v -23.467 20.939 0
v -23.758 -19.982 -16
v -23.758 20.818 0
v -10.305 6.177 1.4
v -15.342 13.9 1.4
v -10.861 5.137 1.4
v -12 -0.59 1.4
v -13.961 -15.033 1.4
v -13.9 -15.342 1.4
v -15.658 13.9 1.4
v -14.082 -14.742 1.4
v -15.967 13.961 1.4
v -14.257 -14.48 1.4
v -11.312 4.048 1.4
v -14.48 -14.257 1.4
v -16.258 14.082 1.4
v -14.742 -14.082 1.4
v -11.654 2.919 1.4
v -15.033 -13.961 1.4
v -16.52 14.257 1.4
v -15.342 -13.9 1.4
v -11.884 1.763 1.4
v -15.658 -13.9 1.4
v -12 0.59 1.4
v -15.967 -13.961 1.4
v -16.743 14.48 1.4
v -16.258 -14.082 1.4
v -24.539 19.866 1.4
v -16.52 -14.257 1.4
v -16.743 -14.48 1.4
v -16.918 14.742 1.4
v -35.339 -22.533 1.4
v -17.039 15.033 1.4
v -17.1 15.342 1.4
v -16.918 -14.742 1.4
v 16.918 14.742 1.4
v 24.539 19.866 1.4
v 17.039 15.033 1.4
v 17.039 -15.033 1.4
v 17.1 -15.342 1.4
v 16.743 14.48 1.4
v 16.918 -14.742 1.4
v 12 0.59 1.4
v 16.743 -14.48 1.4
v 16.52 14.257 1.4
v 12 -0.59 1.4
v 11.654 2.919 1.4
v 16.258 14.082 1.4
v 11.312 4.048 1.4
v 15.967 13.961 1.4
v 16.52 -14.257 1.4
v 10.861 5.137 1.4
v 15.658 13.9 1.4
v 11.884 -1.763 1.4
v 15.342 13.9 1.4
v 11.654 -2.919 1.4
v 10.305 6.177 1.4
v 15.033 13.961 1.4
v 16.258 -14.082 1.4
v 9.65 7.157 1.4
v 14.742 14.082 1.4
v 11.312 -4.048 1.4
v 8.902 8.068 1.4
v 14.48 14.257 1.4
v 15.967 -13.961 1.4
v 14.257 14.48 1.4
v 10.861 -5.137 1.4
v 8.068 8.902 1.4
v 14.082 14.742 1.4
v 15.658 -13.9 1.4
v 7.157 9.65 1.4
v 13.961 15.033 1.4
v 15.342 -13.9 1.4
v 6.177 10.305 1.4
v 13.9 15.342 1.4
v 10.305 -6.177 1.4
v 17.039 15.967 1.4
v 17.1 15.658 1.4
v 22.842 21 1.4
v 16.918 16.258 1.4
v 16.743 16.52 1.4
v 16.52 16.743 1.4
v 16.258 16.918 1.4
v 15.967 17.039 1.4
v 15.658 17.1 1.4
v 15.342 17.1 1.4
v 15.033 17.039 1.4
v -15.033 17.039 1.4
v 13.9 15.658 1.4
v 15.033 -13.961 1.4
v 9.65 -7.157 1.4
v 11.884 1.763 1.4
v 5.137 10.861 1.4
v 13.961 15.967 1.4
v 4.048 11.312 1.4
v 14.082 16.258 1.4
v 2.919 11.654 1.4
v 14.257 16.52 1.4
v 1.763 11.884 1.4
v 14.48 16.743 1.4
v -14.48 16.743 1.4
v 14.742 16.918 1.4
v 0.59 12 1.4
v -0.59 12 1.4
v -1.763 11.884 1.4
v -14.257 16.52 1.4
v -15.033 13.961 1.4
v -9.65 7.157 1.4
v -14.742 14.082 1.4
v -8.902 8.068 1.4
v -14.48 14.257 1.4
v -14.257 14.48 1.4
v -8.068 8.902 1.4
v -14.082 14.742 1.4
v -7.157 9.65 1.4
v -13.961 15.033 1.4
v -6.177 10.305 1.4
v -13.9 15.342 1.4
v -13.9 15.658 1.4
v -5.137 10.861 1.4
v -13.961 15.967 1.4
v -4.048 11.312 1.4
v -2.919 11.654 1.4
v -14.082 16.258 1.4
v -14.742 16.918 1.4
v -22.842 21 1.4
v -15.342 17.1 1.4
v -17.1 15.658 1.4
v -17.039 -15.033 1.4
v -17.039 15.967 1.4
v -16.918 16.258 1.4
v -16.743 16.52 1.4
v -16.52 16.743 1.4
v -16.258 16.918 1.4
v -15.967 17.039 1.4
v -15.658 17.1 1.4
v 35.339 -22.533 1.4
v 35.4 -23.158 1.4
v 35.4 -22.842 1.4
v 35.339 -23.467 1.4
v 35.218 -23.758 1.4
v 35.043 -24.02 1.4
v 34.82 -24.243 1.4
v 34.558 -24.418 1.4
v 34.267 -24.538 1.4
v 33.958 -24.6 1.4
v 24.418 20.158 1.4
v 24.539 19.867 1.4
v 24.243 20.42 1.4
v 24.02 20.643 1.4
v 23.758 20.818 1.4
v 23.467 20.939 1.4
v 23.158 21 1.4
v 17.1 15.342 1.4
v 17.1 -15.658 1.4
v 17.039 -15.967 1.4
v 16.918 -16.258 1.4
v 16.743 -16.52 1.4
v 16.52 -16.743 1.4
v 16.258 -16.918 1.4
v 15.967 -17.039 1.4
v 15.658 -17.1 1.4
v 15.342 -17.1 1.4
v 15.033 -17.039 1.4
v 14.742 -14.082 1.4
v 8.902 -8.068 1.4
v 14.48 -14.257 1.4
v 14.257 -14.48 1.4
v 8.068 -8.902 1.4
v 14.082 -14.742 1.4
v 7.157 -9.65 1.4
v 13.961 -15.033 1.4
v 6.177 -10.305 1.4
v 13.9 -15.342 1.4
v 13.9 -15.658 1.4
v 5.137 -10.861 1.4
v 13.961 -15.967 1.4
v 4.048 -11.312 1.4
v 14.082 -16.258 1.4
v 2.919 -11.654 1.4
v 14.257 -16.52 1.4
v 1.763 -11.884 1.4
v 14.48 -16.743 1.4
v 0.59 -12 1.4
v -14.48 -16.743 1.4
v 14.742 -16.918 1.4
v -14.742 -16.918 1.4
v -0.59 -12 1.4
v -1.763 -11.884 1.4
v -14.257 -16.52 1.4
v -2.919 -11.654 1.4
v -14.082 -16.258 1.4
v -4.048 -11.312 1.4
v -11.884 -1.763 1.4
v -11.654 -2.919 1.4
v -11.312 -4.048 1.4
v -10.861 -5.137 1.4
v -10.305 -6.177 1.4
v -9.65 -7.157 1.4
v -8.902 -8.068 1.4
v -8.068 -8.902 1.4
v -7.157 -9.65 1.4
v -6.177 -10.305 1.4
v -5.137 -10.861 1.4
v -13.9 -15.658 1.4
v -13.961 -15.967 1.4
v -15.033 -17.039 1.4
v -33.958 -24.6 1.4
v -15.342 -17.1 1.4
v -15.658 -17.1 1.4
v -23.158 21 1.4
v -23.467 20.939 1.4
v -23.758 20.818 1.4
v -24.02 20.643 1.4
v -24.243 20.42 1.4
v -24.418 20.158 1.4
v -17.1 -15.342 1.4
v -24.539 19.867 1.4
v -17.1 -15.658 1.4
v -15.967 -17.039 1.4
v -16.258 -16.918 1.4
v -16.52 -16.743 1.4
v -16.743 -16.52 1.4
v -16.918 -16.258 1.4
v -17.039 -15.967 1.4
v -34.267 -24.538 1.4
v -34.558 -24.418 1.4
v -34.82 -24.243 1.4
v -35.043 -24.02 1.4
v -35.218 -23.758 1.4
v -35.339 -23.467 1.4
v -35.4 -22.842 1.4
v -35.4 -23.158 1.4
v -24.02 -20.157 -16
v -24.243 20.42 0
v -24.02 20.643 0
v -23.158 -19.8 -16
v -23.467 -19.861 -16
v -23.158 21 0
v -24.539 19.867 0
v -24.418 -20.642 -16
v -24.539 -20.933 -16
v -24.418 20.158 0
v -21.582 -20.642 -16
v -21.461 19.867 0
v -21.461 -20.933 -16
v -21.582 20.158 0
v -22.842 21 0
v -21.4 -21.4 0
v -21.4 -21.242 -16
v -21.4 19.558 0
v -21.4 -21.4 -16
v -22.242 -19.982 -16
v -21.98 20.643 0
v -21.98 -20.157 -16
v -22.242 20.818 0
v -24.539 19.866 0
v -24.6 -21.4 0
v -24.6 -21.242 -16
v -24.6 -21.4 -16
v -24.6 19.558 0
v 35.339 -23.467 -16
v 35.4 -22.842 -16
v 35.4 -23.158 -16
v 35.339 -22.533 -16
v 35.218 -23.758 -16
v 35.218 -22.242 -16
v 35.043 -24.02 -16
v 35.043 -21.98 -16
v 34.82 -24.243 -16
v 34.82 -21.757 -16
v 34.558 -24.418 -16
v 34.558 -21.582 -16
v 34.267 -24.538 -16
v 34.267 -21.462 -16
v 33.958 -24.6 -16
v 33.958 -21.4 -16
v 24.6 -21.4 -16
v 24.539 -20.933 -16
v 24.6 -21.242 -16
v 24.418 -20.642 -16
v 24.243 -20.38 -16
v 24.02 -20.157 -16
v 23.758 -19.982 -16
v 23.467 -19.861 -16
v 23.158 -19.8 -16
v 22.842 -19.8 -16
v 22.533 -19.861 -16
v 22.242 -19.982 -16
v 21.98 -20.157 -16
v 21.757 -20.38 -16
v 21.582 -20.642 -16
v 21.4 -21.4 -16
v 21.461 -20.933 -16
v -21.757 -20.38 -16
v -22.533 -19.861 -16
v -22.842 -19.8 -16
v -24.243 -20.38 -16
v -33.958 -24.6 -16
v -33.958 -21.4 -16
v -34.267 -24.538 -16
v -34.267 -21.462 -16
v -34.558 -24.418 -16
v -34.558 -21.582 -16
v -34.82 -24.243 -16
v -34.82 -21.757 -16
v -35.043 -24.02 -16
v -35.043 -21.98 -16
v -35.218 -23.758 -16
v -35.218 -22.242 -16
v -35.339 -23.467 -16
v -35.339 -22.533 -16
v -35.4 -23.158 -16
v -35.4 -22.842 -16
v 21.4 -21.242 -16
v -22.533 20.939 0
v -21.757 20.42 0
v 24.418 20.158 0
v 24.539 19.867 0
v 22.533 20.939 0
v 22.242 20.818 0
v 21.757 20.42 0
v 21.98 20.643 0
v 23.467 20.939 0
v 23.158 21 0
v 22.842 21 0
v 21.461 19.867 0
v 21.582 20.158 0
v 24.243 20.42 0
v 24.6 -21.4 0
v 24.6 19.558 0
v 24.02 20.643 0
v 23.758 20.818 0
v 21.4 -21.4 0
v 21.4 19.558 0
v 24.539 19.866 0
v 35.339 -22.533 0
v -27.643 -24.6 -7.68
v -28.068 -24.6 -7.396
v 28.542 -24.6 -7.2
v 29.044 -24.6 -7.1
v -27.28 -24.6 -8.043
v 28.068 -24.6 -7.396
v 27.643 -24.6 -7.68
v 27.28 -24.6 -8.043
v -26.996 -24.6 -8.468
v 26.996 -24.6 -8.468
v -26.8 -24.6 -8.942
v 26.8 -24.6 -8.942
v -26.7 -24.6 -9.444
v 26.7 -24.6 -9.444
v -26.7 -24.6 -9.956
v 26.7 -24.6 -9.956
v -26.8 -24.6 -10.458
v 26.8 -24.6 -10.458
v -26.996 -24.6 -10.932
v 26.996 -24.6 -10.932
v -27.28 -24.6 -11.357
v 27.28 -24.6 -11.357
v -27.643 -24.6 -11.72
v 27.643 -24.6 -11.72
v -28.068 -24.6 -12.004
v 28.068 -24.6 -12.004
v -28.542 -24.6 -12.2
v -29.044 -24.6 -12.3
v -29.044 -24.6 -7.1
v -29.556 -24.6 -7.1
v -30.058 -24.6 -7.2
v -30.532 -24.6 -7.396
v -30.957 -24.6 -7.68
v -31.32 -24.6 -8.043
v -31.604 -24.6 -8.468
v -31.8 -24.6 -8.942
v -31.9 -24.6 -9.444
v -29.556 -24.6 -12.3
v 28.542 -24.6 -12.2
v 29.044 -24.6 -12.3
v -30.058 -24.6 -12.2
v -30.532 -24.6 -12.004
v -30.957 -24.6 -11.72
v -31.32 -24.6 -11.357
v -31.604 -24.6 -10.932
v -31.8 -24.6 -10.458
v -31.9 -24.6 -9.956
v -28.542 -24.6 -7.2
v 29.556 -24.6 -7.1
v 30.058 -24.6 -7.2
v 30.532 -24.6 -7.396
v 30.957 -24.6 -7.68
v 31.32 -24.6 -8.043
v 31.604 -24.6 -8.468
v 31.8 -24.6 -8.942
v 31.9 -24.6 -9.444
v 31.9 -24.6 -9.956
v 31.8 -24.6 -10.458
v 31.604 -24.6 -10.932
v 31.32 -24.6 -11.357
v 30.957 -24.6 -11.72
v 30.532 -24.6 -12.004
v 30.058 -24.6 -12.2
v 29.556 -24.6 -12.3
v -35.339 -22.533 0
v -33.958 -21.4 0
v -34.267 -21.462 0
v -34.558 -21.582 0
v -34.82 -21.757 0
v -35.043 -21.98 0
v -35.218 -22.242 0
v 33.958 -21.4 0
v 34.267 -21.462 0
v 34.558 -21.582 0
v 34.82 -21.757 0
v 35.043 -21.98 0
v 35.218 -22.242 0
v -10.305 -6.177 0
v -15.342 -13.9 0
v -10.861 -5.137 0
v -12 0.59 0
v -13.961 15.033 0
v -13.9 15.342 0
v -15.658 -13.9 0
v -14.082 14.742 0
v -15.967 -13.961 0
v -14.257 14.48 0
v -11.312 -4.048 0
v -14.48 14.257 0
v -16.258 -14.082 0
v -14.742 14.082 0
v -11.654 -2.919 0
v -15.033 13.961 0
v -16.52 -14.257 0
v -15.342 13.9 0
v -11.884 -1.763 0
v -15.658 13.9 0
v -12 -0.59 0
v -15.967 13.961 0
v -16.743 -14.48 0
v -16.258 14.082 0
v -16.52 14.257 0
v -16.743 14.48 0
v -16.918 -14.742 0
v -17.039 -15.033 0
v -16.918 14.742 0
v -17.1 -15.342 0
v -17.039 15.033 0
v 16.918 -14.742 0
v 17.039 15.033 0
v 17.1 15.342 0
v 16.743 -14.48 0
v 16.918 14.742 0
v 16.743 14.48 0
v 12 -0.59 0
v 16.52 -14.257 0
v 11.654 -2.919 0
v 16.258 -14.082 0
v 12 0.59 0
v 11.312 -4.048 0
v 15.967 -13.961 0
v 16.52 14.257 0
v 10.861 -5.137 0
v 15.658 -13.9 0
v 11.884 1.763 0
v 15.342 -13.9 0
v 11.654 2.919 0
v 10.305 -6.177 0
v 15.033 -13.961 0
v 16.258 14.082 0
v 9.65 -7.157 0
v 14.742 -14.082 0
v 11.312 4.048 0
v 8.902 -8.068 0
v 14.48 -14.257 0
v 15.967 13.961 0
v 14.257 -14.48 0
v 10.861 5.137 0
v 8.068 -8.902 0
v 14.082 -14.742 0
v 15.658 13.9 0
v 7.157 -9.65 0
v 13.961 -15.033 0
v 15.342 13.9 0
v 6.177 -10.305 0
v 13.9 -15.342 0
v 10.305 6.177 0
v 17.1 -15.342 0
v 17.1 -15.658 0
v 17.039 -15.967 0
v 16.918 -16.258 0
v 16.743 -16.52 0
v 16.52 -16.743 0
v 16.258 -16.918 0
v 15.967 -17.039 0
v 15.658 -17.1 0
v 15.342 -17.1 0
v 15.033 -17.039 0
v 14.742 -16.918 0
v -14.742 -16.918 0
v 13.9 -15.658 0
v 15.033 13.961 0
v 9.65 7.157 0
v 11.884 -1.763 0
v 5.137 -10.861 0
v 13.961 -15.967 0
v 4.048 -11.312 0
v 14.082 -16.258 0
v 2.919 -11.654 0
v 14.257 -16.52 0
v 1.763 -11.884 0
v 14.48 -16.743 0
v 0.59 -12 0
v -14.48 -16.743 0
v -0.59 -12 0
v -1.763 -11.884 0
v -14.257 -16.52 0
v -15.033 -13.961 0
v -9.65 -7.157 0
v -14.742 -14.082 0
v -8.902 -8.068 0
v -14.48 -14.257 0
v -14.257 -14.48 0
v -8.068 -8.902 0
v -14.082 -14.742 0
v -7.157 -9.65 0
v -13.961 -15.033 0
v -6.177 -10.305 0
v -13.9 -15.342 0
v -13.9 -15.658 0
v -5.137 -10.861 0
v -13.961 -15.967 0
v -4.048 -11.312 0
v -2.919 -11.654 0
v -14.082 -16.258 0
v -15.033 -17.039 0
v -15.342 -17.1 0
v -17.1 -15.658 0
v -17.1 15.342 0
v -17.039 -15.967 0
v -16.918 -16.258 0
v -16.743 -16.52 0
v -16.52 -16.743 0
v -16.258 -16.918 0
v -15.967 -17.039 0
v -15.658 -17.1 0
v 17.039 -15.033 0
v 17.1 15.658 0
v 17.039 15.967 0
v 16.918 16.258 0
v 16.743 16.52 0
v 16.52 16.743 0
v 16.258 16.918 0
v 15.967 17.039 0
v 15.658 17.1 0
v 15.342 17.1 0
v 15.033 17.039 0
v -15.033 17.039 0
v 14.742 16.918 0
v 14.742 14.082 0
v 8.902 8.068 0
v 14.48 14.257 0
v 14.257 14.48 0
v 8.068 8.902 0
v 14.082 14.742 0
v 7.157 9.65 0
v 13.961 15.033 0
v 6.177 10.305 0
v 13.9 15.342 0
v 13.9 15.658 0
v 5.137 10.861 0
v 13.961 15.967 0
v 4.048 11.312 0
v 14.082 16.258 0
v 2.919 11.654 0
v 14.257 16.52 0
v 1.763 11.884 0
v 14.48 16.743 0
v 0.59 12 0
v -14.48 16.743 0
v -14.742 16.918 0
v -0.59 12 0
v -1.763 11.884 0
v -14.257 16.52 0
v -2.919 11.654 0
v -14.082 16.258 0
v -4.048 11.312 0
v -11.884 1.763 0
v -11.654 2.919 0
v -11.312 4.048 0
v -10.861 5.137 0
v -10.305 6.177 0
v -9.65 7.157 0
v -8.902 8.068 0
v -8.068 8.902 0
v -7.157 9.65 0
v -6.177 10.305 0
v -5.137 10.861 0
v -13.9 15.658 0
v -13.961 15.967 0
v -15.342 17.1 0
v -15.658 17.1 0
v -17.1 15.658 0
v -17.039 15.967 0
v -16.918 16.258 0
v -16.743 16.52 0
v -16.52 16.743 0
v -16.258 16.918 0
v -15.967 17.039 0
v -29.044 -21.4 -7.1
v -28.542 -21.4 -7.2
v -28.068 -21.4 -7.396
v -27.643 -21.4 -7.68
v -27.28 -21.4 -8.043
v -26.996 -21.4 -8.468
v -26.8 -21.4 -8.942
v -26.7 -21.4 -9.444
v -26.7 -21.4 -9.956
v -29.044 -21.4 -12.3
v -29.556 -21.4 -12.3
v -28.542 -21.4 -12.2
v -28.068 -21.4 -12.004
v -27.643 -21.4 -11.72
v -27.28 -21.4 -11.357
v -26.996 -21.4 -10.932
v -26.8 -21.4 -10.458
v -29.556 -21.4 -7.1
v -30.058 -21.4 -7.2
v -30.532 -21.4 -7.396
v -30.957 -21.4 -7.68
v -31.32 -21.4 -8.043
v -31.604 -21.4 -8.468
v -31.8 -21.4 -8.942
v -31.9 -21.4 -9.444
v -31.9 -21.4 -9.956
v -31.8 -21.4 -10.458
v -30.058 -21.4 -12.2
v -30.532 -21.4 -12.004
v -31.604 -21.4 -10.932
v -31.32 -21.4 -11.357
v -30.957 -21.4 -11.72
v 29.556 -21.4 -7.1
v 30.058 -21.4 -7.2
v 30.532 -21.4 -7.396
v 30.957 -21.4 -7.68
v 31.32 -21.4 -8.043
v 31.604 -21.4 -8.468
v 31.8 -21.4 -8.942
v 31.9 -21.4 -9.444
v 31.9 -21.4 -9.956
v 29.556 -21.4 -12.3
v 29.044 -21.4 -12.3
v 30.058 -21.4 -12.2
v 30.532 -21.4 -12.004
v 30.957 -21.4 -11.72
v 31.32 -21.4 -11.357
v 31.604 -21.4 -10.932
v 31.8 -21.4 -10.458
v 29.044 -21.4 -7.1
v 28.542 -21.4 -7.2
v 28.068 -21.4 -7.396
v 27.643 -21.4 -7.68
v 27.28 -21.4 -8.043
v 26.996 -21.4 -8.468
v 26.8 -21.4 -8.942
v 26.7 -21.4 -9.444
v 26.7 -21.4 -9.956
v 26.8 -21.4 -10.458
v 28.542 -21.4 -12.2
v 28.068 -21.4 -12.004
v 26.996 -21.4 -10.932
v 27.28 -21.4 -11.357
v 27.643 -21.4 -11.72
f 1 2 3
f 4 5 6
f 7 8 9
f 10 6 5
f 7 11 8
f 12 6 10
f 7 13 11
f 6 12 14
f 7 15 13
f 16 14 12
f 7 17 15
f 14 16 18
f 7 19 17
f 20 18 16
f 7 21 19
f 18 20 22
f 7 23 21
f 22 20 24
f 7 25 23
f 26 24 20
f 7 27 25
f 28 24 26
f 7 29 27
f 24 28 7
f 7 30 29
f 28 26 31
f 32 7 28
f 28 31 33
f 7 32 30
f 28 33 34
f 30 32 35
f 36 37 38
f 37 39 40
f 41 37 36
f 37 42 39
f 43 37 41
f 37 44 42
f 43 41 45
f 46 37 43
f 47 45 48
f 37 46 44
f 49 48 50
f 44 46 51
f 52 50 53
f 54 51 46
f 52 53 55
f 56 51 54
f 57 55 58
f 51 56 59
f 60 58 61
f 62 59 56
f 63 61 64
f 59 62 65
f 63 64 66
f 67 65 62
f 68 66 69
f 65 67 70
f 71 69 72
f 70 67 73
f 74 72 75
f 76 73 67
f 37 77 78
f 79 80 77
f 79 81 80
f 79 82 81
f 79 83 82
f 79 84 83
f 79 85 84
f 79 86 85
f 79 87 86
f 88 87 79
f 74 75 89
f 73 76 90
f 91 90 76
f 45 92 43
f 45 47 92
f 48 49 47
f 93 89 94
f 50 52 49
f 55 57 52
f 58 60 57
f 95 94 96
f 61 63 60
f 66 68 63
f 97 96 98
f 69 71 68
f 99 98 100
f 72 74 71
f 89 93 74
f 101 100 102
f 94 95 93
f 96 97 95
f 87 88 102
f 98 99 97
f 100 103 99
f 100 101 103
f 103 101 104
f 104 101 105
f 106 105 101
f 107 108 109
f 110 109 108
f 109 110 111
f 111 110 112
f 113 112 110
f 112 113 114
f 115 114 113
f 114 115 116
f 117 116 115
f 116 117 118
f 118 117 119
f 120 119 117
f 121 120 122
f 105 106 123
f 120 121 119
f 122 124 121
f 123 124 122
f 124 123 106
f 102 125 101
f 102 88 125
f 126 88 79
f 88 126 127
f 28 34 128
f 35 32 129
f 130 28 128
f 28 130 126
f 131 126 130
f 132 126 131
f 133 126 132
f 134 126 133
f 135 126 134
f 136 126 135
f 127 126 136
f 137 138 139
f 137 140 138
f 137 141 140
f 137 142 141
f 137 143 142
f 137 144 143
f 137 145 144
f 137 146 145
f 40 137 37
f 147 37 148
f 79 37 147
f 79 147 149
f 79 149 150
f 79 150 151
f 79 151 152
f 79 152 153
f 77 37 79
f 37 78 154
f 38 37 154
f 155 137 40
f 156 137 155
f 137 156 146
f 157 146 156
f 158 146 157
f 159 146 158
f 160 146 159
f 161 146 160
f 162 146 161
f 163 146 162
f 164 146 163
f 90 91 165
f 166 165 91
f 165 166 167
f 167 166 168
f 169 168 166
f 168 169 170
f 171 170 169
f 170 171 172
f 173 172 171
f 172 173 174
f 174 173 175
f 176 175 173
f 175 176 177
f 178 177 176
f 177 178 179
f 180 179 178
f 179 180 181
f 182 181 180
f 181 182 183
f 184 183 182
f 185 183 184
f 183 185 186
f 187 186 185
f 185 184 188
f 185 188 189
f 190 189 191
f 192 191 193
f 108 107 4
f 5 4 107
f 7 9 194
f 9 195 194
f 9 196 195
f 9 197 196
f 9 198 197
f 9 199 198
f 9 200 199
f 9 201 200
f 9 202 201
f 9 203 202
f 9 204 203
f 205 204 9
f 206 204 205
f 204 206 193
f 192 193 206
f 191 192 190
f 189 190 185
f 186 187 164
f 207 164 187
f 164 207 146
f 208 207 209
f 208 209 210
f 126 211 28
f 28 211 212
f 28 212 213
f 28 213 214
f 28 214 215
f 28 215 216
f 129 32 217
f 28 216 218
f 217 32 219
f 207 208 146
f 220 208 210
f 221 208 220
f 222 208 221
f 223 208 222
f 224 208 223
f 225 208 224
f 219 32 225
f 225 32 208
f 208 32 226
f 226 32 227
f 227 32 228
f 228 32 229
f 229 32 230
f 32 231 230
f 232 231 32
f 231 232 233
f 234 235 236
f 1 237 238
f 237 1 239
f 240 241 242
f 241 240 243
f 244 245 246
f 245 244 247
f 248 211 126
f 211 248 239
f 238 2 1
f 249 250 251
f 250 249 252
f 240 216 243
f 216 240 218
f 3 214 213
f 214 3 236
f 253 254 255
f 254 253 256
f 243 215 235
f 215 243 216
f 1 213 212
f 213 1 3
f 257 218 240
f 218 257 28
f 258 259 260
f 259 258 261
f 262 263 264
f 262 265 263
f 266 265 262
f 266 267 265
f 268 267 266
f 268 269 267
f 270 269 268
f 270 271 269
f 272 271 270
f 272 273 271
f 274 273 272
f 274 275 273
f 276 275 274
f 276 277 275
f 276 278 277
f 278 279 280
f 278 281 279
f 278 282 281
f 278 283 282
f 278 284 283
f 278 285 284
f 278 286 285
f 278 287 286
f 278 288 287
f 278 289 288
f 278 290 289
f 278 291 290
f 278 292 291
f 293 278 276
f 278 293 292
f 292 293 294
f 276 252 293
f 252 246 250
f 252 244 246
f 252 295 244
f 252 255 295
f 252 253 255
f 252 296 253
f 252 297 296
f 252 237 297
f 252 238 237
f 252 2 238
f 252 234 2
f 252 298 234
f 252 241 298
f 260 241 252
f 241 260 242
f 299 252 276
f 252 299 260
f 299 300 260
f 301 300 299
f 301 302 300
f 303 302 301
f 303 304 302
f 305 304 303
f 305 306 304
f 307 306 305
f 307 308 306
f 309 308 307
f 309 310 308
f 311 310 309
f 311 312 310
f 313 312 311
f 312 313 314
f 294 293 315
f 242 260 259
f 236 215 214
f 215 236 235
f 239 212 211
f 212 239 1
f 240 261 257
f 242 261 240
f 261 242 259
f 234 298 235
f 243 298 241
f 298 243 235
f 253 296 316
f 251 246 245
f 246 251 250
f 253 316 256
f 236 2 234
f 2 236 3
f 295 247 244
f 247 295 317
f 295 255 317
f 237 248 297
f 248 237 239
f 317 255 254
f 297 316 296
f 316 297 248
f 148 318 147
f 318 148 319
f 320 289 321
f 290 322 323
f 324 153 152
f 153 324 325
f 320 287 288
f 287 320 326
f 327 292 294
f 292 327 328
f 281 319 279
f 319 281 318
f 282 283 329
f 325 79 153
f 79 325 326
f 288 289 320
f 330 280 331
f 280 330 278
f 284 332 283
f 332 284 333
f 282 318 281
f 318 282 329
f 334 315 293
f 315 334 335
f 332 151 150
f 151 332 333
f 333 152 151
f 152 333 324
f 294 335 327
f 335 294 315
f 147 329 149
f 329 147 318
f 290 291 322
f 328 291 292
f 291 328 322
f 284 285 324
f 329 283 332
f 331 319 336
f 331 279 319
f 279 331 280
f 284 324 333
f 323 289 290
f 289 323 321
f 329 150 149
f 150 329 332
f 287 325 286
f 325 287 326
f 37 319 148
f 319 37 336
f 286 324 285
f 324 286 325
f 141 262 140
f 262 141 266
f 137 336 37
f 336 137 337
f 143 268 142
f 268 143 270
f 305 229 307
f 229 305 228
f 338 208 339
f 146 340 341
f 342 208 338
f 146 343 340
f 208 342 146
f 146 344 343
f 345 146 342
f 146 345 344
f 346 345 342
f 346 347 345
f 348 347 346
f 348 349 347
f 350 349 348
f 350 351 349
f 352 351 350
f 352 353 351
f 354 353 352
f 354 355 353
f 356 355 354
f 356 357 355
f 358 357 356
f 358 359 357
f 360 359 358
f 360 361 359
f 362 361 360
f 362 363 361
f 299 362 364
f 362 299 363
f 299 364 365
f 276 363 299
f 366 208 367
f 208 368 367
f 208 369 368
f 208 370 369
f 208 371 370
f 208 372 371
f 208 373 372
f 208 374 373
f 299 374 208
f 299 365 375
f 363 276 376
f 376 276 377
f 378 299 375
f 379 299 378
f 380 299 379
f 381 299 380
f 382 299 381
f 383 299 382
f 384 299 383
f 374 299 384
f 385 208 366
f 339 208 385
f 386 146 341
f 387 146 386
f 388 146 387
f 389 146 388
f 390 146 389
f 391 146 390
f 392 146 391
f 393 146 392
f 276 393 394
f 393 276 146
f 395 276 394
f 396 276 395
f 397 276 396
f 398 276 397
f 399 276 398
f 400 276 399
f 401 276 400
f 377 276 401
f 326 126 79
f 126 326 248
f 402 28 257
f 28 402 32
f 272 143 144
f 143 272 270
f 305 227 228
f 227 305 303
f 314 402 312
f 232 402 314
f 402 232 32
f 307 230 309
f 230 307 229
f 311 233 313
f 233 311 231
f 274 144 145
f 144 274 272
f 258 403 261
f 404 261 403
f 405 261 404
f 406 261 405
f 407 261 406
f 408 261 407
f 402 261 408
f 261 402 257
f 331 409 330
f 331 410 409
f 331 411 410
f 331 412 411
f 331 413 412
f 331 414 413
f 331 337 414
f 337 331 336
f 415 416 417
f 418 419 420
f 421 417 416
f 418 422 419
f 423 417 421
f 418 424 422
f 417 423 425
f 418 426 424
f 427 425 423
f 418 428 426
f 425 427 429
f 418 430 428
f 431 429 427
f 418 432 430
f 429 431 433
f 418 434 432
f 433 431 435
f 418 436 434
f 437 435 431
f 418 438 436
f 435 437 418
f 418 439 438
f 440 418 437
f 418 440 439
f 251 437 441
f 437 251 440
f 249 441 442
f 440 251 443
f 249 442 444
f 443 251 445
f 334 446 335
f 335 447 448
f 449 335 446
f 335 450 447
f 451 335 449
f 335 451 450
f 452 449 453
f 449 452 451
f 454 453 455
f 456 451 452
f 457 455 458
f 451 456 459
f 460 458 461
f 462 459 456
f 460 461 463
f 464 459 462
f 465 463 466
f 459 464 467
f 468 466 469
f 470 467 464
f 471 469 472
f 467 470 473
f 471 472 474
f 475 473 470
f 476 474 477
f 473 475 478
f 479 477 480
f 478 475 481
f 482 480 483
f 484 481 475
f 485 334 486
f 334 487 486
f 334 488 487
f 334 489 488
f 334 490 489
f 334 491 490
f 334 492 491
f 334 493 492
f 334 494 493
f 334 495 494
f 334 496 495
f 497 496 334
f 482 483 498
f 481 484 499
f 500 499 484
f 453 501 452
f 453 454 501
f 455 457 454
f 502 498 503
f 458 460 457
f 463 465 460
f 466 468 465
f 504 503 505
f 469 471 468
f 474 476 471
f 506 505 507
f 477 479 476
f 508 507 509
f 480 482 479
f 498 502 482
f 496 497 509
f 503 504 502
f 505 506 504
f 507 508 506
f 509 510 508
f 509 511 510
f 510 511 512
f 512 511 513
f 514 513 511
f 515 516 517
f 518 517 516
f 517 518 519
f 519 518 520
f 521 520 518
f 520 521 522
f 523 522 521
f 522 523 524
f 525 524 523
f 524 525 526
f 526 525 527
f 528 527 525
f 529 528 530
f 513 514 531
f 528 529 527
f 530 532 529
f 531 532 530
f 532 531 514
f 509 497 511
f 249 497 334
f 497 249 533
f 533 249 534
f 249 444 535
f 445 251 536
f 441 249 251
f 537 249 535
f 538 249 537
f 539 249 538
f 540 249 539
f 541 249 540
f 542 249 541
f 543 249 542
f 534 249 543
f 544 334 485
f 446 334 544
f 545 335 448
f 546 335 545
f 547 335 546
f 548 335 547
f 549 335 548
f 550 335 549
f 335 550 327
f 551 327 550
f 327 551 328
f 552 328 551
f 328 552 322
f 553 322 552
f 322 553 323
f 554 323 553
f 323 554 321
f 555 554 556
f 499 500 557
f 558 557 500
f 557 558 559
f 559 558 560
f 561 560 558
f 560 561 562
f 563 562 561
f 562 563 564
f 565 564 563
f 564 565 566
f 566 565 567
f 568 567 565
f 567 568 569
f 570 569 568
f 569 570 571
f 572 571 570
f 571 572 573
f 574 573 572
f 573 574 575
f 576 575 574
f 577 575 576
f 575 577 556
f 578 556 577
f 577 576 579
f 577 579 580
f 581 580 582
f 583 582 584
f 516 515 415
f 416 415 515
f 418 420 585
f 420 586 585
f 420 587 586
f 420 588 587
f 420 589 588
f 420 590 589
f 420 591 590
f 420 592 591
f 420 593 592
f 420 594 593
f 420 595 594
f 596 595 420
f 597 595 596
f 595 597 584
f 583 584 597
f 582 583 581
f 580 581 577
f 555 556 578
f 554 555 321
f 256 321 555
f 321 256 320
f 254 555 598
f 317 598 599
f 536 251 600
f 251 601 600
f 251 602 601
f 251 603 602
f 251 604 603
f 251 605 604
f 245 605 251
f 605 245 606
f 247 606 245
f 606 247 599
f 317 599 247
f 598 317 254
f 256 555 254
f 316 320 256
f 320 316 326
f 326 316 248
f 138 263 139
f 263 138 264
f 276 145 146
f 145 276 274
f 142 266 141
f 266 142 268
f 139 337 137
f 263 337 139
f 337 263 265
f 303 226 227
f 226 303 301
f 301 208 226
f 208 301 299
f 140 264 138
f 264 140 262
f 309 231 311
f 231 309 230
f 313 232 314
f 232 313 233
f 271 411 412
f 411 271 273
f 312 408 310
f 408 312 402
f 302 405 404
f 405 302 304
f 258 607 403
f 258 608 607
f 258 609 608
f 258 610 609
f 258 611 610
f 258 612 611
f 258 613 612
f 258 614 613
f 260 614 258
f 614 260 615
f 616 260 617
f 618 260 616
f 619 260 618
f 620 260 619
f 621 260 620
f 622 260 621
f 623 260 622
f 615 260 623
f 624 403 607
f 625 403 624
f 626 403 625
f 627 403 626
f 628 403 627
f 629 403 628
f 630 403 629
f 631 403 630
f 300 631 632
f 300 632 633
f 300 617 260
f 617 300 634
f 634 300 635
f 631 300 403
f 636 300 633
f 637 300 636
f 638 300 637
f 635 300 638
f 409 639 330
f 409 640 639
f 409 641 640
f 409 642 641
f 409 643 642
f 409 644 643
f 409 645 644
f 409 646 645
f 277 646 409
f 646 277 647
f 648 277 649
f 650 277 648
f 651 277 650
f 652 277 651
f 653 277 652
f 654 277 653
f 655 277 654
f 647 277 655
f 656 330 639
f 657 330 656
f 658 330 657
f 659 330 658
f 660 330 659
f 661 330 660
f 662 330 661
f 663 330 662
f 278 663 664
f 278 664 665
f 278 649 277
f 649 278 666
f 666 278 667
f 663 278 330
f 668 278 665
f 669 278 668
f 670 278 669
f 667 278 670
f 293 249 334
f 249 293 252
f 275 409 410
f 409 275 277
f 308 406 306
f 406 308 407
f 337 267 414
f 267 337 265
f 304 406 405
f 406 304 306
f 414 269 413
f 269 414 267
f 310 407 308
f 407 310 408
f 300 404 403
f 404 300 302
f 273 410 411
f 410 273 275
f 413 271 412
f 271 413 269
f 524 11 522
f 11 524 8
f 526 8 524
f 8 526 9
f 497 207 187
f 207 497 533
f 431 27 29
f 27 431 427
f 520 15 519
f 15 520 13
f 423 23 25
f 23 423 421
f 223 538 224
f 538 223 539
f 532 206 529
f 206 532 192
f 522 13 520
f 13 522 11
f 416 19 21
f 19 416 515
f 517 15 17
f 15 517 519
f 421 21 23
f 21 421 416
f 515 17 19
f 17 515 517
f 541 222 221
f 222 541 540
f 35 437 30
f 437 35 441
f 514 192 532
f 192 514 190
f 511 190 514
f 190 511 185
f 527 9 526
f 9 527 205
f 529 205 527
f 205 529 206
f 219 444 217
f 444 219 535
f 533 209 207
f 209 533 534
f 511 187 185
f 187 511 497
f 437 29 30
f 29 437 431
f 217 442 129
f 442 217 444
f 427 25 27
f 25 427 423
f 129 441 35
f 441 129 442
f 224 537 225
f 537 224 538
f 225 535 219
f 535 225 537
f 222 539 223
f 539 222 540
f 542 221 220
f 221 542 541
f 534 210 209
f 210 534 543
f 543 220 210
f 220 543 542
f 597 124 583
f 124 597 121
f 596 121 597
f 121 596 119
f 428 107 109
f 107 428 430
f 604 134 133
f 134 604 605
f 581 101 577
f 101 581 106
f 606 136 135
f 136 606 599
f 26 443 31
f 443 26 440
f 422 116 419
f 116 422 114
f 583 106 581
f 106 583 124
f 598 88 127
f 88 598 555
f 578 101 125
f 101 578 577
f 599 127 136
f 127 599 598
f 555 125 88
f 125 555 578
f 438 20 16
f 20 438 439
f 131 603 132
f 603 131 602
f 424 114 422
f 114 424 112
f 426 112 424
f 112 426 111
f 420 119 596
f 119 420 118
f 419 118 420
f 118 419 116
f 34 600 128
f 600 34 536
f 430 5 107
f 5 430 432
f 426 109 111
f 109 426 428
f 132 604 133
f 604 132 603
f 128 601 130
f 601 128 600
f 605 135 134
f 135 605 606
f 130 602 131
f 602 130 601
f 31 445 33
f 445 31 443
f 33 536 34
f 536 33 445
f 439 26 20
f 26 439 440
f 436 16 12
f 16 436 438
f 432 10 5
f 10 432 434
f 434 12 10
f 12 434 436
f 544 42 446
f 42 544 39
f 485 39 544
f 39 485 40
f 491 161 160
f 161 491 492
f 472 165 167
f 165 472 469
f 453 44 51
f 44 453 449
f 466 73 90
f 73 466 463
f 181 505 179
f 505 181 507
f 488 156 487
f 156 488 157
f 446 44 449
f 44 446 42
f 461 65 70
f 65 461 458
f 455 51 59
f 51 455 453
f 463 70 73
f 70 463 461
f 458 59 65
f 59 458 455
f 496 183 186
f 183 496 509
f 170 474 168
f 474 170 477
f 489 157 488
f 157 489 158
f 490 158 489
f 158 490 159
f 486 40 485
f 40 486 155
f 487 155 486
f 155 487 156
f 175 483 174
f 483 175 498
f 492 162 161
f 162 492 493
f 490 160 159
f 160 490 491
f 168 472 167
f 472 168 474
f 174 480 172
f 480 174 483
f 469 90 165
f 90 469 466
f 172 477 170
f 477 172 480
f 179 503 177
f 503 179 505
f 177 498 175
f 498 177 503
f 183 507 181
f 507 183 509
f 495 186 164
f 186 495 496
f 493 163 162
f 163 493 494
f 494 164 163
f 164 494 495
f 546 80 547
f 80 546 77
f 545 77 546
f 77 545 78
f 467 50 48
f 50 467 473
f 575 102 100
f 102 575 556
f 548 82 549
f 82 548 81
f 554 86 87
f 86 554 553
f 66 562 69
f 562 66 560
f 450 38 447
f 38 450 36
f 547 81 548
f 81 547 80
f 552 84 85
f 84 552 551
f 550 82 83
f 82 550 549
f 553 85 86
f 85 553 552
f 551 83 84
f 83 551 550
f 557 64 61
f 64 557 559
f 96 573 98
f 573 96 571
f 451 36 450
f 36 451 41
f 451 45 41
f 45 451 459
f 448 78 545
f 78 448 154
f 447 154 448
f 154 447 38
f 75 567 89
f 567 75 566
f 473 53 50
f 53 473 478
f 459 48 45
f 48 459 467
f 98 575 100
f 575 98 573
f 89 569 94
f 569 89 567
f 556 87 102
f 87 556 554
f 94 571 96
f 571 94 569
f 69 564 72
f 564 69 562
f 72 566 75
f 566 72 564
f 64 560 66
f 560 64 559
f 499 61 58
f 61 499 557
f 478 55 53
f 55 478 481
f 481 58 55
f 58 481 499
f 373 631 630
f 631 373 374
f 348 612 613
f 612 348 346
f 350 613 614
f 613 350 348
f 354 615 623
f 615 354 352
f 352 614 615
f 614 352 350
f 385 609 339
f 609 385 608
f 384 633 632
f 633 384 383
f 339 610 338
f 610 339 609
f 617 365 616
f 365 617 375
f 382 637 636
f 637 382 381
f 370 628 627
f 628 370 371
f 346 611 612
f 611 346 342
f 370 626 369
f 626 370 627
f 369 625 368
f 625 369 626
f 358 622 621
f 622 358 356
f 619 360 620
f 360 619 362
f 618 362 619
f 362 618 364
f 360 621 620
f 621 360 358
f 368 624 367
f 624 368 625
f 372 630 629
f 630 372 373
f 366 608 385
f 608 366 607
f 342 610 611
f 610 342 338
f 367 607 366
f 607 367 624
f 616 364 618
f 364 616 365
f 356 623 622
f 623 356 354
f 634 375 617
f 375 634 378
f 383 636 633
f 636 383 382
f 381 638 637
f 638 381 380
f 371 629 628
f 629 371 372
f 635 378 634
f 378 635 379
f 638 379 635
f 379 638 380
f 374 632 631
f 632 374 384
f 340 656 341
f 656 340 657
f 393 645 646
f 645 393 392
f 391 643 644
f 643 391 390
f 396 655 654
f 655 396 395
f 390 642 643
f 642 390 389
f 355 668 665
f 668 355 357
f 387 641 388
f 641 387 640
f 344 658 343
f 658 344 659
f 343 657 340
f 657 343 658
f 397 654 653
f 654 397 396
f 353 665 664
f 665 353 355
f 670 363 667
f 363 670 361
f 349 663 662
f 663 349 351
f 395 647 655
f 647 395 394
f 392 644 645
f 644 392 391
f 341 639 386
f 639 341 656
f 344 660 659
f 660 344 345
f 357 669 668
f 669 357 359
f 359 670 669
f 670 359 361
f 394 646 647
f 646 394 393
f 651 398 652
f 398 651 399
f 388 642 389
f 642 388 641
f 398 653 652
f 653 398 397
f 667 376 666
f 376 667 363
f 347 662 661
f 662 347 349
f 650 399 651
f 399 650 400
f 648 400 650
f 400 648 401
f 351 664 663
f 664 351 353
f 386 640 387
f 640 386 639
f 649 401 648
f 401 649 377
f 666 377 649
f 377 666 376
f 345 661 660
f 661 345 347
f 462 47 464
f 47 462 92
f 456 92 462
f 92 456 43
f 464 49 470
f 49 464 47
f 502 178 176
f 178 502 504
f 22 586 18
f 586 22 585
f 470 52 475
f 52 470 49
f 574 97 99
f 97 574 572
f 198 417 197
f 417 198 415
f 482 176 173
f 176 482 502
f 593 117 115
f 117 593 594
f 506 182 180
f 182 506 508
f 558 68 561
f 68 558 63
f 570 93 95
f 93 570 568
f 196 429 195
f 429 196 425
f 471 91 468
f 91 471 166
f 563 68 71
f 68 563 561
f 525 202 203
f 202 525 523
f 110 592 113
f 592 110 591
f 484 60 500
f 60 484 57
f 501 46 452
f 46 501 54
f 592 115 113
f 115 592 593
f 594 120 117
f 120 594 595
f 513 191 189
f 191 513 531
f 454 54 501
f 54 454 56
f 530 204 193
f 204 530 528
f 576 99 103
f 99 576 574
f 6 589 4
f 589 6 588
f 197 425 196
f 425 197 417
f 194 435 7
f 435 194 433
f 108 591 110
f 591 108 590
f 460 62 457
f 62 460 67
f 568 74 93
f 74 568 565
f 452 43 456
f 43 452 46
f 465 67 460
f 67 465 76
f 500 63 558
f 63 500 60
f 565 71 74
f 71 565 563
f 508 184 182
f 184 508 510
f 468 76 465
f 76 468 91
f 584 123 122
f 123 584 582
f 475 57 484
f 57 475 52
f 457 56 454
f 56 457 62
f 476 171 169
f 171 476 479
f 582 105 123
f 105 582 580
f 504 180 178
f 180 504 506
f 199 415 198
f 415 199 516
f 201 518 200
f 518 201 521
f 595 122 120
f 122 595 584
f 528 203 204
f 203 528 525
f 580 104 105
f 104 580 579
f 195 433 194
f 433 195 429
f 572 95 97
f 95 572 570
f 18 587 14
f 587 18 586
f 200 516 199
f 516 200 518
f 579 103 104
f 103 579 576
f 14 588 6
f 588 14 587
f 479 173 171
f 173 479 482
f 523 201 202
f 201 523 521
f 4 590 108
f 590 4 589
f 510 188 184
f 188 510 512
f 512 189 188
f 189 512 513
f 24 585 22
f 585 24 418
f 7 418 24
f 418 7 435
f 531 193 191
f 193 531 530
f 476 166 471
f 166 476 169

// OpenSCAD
// file: ../lib/util.scad
resolution = 32;

function accurate_diam(diam,sides) = 1 / cos(180/sides) / 2 * diam;

module hole(diam,len,sides=8) {
  rotate([0,0,180/sides]) {
    cylinder(r=accurate_diam(diam,sides),h=len,center=true,$fn=sides);
  }
}

module accurate_circle(diam,sides=8) {
  rotate([0,0,180/sides]) {
    circle(r=accurate_diam(diam,sides),$fn=sides);
  }
}

module debug_axes() {
  color("red") translate([50,0,0]) cube([100,.2,.2],center=true);
  color("green") translate([0,50,0]) cube([.2,100,.2],center=true);
  color("blue") translate([0,0,50]) cube([.2,.2,100],center=true);
}

module ring(id,thickness,height,fn=16) {
  od = id + thickness;
  linear_extrude(height=height,center=true) {
    difference() {
      accurate_circle(od,fn);
      accurate_circle(id,fn);
    }
  }
}

module rounded_square(width,depth,diam,fn=resolution) {
  pos_x = width/2-diam/2;
  pos_y = depth/2-diam/2;

  hull() {
    for(x=[left,right]) {
      for(y=[front,rear]) {
        translate([x*pos_x,y*pos_y,0]) {
          accurate_circle(diam,fn);
        }
      }
    }
  }
}

module rounded_cube(width,depth,height,diam,fn=resolution) {
  linear_extrude(height=height,center=true,convexity=3) {
    rounded_square(width,depth,diam,fn);
  }
}

module round_corner_filler(diam,length) {
  linear_extrude(height=length,center=true,convexity=3) {
    round_corner_filler_profile(diam);
  }
}

module round_corner_filler_profile(diam,res=resolution) {
  extra = 0.1;
  main = diam/2+extra;
  difference() {
    translate([diam/4-extra,diam/4-extra,0]) {
      square([main,main],center=true);
    }
    translate([diam/2,diam/2,0]) {
      accurate_circle(diam,res);
    }
  }
}

module space_along_length(length,min_hole_spacing=4*inch,from_end=1*inch) {
  avail_length = length - (from_end*2);
  num_spaces   = floor(avail_length / min_hole_spacing);
  extra_space  = (avail_length - (num_spaces*min_hole_spacing)) / num_spaces;
  spacing      = min_hole_spacing + extra_space;

  // echo(length, num_spaces, spacing);

  translate([0,-length/2+from_end,0]) {
    for(y=[0:num_spaces]) {
      translate([0,y*spacing,0]) {
        children();
      }
    }
  }
}

module letter_spike(thin_width,thick_width,thickness) {
  hull() {
    cylinder(r=thin_width,h=thickness*2,center=true,$fn=16);
    cylinder(r=thick_width,h=0.01,center=true,$fn=16);
  }
}

module letter_L(width=10,height=20,thickness=0.5,thick_width=2,thin_width=0.3) {
  lines = [
    [
      [-width/2,height/2,0],
      [-width/2,-height/2,0],
    ],
    [
      [-width/2,-height/2,0],
      [width/2,-height/2,0],
    ],
  ];

  for(pair=lines) {
    hull() {
      for(vect=pair) {
        translate(vect) {
          letter_spike(thin_width,thick_width,thickness);
        }
      }
    }
  }
}

module letter_R(width=10,height=20,thickness=0.5,thick_width=2,thin_width=0.3) {
  lines = [
    [
      [-width/2,height/2,0],
      [-width/2,-height/2,0],
    ],
    [
      [-width/2,height/2,0],
      [width/2,height/3,0],
    ],
    [
      [width/2,height/3,0],
      [-width/4,0,0],
    ],
    [
      [-width/2,0,0],
      [-width/4,0,0],
    ],
    [
      [-width/4,0,0],
      [width/2,-height/2,0],
    ],
  ];

  for(pair=lines) {
    hull() {
      for(vect=pair) {
        translate(vect) {
          letter_spike(thin_width,thick_width,thickness);
        }
      }
    }
  }
}

module zip_tie_cavity(inner_diam_input,zip_tie_thickness,zip_tie_width,fn=resolution) {
  inner_diam = inner_diam_input -0.05;
  overall_width = inner_diam+zip_tie_thickness*2;

  module profile() {
    for(x=[left,right]) {
      translate([x*(inner_diam/2+zip_tie_thickness/2),overall_width,0]) {
        square([zip_tie_thickness,overall_width*2],center=true);
      }
    }

    intersection() {
      translate([0,-overall_width,0]) {
        square([overall_width*2,overall_width*2],center=true);
      }
      difference() {
        accurate_circle(inner_diam+zip_tie_thickness*2,fn);
        accurate_circle(inner_diam,fn);
      }
    }
  }

  linear_extrude(height=zip_tie_width,convexity=3,center=true) {
    profile();
  }
}

module printed_extrusion_carriage_profile(body_width,body_height) {
  spring_thickness = extrude_width*4;
  spring_gap_width = 1;
  preload = -0.2; // negative makes more slack both for print and UHMWPE tape
  wall_thickness = extrude_width*4;

  cavity_width = body_width - wall_thickness*4;
  cavity_height = body_height - wall_thickness*4;

  module spring_profile() {
    contact_width = 8;

    translate([0,-preload+spring_thickness/2]) {
      translate([left*(y_rail_extrusion_width/2-contact_width/2),0,0]) {
        rounded_square(contact_width,spring_thickness,spring_thickness);
      }
      hull() {
        translate([left*(y_rail_extrusion_width/2-contact_width+spring_thickness/2),0,0]) {
          accurate_circle(spring_thickness,resolution);
        }
        translate([right*(y_rail_extrusion_width/2-spring_thickness),spring_gap_width/2,0]) {
          accurate_circle(spring_thickness,resolution);
        }
      }
      translate([right*(y_rail_extrusion_width/2-spring_thickness),2-spring_thickness/2+spring_gap_width/2,0]) {
        rounded_square(spring_thickness,4,spring_thickness);
      }
    }
  }

  for(z=[top,bottom]) {
    mirror([0,1-z,0]) {
      translate([0,y_rail_extrusion_height/2]) {
        spring_profile();
      }

      for(x=[left,right]) {
        mirror([1-x,0,0]) {
          translate([y_rail_extrusion_width/2,y_rail_extrusion_height/4,0]) {
            rotate([0,0,-90]) {
              spring_profile();
            }
          }
        }
      }
    }
  }

  difference() {
    gap_width = cavity_height - y_rail_extrusion_height;
    rounded_square(body_width,body_height,wall_thickness*8);
    rounded_square(cavity_width,cavity_height,gap_width);
  }
}

module bevel(outer,inner,height) {
  hull() {
    translate([0,0,-height-0.05]) {
      hole(outer,0.1,resolution);
    }
    translate([0,0,-0.05]) {
      hole(inner,0.1,resolution);
    }
  }
}

module mid_air_hole(shaft_diam,head_diam,layer_height=0.2,depth=50,resolution=32) {
  translate([0,0,-depth/2]) {
    hole(shaft_diam,depth,resolution);
  }
  translate([0,0,depth/2]) {
    hole(head_diam,depth,resolution);
  }
  intersection() {
    hole(head_diam,layer_height*8,resolution);
    union() {
      cube([shaft_diam,head_diam+1,layer_height*2],center=true);
      cube([shaft_diam,shaft_diam,layer_height*4],center=true);
      hole(shaft_diam,layer_height*6,8);
    }
  }
}

/*
translate([-10,0,0]) {
  letter_L();
}

translate([10,0,0]) {
  letter_R();
}
*/
// main file
include <../config.scad>;
use <../lib/util.scad>;
use <../lib/vitamins.scad>;

mount_thickness = 1.4;

module motor_mount(motor_side,hole_spacing,shoulder_diam) {
  wall_thickness = extrude_width*4;
  round_diam = wall_thickness*2;

  overall_motor_side = motor_side+2*(tolerance*2+wall_thickness*2);
  overall_mount_width = overall_motor_side + tolerance*2 + m5_bolt_head_diam*2 + round_diam;
  mounting_hole_pos_x = overall_mount_width/2-m5_bolt_head_diam/2-round_diam/2; // motor_side/2+wall_thickness+tolerance+m5_bolt_head_diam/2;
  mounting_hole_pos_z = -m5_bolt_head_diam/2-5-tolerance;
  mount_height = abs(mounting_hole_pos_z) + m5_bolt_head_diam/2 + tolerance + wall_thickness;

  echo("wall_thickness: ", wall_thickness);

  module body() {
    translate([0,0,mount_thickness/2]) {
      hull() {
        translate([0,-(wall_thickness*2+tolerance)/2,0]) {
          rounded_cube(overall_motor_side,motor_side+tolerance+wall_thickness*2,mount_thickness,round_diam,resolution);
        }
        translate([0,-overall_motor_side/2+round_diam/2,0]) {
          rounded_cube(overall_mount_width,round_diam,mount_thickness,round_diam,resolution);
        }
      }
    }

    for (x=[left,right]) {
      translate([x*(overall_motor_side/2-round_diam/2),0,0]) {
        hull() {
          translate([0,motor_side/2-round_diam/2,mount_thickness/2]) {
            hole(wall_thickness*2,mount_thickness,resolution);
          }
          translate([0,-(overall_motor_side/2-round_diam),-mount_height/2]) {
            hole(wall_thickness*2,mount_height,resolution);
          }
        }
      }
    }

    translate([0,-overall_motor_side/2+round_diam/2,-mount_height/2]) {
      rounded_cube(overall_mount_width,round_diam,mount_height,round_diam,resolution);
    }
  }

  module holes() {
    hole(shoulder_diam+2,mount_thickness*4,resolution*2);

    for (x=[left,right]) {
      for (y=[front,rear]) {
        translate([x*hole_spacing/2,y*hole_spacing/2,mount_thickness/2]) {
          hole(3+tolerance,mount_thickness*3,resolution);
        }
      }


      translate([x*mounting_hole_pos_x,-motor_side/2,mounting_hole_pos_z]) {
        rotate([90,0,0]) {
          # hole(m5_loose_hole,30,resolution);
        }
      }
    }
  }

  difference() {
    body();
    holes();
  }

  % motor_nema17();
}

module nema17_motor_mount() {
  motor_mount(nema17_side,nema17_hole_spacing,nema17_shoulder_diam);
}

nema17_motor_mount();
